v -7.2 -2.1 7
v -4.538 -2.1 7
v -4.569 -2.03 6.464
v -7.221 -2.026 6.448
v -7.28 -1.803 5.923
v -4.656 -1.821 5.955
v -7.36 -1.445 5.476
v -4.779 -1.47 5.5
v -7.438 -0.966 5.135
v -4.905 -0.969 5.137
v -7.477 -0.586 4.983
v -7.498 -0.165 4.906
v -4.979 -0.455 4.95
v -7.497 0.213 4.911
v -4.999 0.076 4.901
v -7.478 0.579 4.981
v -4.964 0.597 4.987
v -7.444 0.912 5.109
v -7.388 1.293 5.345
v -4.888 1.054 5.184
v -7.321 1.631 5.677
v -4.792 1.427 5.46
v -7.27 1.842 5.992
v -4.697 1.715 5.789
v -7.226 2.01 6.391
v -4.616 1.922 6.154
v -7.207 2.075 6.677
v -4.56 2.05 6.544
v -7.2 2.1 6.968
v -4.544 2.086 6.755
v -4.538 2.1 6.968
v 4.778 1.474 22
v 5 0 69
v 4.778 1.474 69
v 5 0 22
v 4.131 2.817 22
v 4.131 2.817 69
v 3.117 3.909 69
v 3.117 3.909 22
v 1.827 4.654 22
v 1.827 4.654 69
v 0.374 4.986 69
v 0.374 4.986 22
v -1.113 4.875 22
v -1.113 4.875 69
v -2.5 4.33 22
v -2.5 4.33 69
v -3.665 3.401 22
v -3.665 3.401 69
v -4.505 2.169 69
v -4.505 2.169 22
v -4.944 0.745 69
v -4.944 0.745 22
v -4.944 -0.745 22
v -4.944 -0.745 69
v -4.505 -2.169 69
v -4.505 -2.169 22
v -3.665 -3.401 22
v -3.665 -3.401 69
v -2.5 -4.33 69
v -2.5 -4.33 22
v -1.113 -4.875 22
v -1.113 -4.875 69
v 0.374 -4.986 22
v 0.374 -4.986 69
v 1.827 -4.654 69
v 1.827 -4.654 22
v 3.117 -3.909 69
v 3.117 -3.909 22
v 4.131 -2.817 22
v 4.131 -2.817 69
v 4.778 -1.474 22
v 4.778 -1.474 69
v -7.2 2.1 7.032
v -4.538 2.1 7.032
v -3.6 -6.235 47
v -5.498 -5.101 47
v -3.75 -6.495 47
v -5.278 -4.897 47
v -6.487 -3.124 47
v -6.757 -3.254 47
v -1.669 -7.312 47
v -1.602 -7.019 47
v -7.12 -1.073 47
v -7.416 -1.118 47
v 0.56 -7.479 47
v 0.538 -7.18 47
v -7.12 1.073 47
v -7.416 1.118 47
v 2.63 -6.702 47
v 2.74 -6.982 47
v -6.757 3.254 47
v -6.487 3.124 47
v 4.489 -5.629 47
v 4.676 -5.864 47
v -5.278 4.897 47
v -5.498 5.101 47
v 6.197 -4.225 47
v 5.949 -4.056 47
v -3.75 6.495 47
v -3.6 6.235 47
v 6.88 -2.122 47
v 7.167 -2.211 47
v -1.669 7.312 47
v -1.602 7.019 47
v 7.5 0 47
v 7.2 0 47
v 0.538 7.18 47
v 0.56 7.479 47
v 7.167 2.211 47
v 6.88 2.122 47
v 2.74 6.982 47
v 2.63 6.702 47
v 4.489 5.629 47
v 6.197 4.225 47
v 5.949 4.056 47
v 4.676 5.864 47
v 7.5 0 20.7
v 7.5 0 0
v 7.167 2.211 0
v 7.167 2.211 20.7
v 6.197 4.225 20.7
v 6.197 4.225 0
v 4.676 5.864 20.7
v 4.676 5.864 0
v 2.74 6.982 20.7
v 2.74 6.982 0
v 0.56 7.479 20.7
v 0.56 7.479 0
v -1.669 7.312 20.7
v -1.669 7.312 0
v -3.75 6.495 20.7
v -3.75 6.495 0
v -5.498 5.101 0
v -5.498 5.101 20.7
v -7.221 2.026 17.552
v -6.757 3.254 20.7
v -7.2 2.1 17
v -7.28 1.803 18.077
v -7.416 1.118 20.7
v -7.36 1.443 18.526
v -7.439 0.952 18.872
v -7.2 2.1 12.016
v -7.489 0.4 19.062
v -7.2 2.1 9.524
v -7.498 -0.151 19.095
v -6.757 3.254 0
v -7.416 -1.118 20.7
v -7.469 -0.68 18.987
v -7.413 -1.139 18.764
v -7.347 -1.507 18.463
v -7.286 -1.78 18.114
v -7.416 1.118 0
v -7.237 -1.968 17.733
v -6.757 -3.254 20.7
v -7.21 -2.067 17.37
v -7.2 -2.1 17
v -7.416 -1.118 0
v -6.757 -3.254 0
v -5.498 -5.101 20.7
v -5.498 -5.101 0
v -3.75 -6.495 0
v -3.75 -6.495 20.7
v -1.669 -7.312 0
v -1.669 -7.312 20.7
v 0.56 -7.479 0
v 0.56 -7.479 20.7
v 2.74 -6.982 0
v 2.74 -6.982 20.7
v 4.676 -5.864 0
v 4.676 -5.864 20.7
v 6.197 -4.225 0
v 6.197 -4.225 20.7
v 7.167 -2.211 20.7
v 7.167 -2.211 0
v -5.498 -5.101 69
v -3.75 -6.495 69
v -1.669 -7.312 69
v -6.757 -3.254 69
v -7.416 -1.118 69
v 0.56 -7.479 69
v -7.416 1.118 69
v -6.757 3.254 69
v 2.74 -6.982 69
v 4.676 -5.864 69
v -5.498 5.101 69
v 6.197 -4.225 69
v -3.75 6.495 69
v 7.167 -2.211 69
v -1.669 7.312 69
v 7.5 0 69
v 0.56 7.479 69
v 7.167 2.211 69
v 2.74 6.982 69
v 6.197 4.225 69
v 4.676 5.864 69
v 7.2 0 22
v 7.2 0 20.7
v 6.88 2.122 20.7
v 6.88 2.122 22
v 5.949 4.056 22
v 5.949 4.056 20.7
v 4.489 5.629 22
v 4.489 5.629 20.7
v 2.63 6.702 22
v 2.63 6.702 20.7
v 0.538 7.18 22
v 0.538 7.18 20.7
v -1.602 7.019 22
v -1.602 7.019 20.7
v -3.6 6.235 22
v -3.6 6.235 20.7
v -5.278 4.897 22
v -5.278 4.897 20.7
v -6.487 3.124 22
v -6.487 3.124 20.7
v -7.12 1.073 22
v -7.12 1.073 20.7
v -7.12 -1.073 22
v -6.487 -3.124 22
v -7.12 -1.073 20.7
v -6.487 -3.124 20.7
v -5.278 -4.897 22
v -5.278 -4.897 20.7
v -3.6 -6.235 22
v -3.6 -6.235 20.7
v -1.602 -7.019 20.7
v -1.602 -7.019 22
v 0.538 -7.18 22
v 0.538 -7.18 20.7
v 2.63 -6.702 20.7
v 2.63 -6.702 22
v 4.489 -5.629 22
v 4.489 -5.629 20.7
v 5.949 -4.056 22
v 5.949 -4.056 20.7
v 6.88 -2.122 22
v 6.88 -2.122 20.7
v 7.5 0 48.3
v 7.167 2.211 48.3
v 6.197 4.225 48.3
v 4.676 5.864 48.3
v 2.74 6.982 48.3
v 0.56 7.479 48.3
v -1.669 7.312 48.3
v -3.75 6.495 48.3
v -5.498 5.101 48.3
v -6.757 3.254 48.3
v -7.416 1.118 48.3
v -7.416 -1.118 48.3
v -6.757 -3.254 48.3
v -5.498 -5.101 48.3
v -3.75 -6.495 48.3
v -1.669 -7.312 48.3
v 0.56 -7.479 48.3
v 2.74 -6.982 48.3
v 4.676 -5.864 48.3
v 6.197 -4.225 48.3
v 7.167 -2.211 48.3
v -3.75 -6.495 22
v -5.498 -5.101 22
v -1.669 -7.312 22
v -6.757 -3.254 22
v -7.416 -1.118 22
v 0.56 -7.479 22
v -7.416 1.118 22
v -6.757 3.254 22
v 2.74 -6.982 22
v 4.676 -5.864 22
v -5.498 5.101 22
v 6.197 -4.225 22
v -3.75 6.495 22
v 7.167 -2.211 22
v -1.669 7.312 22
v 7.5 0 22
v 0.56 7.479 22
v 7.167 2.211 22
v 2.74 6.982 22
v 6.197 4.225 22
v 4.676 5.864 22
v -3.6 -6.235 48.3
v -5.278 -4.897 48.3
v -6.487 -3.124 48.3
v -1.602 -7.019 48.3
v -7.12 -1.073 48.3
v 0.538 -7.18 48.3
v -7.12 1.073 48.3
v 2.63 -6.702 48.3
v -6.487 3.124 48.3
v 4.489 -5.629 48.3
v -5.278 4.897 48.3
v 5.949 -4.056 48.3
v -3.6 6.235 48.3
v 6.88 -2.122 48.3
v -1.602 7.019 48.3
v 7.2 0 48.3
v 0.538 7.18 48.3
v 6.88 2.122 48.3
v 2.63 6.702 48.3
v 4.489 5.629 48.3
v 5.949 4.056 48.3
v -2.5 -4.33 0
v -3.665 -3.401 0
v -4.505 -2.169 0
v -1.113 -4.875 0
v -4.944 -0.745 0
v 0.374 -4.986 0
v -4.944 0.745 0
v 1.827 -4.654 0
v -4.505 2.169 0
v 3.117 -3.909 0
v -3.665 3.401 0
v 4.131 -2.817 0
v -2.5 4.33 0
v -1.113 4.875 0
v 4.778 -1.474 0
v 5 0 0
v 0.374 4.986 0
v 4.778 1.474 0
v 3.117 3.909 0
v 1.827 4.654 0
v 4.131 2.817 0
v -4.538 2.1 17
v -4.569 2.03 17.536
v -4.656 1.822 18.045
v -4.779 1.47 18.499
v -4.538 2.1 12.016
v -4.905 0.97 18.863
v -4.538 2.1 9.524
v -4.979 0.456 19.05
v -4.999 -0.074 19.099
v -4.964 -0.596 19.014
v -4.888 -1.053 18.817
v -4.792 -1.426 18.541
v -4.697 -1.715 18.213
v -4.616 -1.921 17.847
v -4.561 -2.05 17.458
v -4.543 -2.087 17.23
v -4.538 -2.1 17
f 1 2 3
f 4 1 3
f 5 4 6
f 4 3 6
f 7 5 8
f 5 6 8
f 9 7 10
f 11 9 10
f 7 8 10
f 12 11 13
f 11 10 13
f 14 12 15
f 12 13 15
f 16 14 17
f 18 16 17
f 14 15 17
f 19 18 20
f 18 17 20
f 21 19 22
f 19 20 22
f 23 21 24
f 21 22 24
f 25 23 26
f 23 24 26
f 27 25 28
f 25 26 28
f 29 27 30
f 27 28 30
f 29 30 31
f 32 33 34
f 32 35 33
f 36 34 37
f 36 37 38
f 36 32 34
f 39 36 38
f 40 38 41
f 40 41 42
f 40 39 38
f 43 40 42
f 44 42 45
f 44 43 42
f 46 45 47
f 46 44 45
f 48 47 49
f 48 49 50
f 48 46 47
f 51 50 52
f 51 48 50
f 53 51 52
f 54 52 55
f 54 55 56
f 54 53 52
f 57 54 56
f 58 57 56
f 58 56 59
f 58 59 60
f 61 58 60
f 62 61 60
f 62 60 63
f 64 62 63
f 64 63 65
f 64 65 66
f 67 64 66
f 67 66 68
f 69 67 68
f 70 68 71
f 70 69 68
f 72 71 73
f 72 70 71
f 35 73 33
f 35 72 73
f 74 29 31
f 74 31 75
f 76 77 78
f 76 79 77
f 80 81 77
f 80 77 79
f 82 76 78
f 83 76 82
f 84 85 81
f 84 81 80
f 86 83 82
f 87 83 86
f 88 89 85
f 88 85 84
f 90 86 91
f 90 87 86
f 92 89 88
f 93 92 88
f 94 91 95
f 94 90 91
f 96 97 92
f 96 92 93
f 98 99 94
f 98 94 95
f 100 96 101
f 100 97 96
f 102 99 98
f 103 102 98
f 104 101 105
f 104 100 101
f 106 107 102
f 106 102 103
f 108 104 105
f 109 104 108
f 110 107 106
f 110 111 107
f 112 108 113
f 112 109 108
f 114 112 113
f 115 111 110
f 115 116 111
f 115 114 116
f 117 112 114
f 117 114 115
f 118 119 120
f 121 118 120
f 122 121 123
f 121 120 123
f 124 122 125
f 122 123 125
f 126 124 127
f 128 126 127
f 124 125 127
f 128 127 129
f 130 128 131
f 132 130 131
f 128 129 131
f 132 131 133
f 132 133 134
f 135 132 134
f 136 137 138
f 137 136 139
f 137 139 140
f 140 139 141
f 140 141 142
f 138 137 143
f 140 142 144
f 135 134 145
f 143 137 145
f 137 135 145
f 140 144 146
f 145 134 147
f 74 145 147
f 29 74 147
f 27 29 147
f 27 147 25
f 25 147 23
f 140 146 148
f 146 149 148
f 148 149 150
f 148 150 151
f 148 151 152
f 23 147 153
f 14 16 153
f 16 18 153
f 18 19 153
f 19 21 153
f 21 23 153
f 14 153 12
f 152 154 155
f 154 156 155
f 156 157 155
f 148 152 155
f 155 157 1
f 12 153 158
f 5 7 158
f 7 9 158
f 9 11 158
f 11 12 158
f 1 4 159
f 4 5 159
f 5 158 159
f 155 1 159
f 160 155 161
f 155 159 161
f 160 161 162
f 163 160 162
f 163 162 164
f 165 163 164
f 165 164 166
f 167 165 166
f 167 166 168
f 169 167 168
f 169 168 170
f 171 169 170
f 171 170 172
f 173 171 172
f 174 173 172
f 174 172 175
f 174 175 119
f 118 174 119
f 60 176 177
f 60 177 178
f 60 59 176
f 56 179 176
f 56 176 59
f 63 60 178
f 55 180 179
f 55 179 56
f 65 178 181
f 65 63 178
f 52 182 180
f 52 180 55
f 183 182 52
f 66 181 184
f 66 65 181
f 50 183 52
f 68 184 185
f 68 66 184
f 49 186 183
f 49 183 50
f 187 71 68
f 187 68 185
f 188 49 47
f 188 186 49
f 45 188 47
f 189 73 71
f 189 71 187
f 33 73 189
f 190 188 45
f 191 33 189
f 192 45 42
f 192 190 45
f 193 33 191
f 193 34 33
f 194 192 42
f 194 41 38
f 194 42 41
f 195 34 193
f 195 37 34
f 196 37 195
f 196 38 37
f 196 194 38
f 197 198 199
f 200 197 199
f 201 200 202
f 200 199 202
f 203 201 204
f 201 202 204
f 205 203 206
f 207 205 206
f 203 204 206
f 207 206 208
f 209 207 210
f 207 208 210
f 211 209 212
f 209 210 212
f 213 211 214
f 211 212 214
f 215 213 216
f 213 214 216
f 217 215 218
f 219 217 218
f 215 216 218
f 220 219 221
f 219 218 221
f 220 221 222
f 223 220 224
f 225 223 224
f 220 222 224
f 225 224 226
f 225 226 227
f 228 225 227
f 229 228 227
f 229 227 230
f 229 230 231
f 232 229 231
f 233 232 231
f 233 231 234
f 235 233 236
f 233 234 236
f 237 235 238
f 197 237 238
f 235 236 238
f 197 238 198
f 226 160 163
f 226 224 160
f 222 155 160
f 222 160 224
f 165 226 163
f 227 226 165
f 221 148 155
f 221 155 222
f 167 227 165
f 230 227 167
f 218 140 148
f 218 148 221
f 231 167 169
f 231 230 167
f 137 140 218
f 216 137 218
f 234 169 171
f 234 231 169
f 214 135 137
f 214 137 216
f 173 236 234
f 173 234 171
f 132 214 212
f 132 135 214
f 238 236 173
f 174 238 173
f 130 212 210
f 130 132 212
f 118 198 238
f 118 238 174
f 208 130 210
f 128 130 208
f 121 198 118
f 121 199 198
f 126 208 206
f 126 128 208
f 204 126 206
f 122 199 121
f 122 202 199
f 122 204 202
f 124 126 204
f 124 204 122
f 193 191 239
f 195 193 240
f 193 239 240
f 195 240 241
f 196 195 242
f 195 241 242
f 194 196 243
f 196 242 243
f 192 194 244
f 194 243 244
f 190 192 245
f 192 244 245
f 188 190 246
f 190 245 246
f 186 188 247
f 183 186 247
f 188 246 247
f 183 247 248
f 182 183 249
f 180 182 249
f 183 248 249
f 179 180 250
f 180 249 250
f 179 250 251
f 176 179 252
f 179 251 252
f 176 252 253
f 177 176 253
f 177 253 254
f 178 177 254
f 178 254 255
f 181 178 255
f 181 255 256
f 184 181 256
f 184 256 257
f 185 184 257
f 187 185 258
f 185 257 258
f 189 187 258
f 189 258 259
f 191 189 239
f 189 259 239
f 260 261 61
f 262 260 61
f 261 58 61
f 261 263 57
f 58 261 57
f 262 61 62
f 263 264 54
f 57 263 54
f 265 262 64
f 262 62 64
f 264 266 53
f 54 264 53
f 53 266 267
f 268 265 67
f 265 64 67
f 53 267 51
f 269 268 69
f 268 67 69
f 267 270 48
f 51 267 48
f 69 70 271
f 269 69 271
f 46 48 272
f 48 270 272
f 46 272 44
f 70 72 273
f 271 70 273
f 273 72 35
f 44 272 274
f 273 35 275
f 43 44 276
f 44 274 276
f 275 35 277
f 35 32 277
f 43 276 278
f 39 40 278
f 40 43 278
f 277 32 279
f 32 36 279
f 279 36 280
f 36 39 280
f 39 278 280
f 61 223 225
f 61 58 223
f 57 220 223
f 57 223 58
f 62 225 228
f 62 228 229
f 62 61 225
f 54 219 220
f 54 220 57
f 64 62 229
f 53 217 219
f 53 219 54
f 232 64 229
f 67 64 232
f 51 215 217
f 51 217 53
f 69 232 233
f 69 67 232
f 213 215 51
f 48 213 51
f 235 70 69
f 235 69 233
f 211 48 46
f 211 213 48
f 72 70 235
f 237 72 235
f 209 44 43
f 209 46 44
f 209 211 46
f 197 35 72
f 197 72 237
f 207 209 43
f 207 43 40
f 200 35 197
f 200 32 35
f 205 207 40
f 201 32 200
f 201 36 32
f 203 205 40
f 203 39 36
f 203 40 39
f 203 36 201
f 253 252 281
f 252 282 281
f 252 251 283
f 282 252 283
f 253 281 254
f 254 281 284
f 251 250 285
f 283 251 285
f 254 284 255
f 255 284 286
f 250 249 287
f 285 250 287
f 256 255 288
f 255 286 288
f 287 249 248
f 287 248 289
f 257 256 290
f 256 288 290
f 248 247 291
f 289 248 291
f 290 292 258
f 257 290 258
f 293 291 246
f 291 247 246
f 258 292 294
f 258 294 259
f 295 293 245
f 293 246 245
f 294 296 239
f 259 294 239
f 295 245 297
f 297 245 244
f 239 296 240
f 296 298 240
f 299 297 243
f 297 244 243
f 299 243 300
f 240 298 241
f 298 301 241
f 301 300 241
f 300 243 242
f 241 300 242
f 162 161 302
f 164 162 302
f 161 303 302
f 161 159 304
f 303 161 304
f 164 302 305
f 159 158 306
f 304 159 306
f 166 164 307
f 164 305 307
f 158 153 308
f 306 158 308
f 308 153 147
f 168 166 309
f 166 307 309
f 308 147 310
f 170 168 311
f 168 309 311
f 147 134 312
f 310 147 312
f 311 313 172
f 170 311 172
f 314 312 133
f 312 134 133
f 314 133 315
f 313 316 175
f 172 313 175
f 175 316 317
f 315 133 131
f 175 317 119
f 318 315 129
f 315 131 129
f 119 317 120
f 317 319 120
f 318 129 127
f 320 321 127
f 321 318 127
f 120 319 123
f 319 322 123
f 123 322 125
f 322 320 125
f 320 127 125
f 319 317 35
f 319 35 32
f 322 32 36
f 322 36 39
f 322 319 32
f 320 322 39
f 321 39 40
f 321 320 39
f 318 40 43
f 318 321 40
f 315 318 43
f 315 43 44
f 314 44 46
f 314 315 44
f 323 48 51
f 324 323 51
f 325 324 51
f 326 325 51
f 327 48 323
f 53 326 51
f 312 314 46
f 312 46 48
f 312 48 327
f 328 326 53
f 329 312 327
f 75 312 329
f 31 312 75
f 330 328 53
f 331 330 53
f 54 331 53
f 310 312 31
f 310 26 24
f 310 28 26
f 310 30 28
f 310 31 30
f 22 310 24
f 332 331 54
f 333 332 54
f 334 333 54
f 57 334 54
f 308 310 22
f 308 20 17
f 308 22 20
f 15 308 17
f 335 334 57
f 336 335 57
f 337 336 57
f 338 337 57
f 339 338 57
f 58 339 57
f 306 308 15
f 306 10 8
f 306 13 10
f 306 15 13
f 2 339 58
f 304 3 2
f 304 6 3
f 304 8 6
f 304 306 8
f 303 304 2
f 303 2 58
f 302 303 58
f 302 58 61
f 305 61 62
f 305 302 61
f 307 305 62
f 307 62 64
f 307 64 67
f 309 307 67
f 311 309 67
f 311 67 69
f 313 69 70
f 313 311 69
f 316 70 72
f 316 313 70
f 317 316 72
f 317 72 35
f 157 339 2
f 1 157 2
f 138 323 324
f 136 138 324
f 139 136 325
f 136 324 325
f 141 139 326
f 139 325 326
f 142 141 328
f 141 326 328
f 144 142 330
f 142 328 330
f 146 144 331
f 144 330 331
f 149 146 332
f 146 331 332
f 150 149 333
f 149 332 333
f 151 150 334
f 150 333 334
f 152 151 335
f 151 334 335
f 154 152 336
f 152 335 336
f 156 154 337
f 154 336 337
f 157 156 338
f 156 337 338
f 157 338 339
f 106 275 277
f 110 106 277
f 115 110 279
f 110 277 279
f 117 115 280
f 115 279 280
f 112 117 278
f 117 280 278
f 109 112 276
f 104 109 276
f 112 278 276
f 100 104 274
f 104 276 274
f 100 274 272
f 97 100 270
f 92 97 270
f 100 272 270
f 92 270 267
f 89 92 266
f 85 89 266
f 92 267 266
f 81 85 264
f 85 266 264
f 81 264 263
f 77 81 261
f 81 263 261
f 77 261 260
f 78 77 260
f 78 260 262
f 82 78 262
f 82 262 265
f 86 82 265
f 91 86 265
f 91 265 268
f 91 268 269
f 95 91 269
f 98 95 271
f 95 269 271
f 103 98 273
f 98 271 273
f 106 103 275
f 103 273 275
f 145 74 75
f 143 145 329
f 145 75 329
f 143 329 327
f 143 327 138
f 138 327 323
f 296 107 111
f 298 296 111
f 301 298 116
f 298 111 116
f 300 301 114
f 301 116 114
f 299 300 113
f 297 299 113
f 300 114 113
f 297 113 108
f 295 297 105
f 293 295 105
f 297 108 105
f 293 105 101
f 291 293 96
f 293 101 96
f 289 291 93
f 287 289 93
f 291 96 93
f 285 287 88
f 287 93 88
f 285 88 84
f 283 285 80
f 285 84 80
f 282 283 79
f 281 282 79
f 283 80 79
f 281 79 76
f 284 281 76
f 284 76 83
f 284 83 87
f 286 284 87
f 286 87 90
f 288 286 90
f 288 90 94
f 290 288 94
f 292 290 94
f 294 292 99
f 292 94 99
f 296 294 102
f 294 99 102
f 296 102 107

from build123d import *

# Parameters (mm, degrees)
F0_R      = 7.5
F0_R_2    = 5
F1_DEPTH  = 20.7
F2_R      = 7.2
F2_R_2    = 5
F3_DEPTH  = 1.3
F4_R      = 7.5
F4_R_2    = 7.2
F4_R_3    = 5
F5_DEPTH  = 25
F6_R      = 7.2
F6_R_2    = 5
F7_DEPTH  = 1.3
F8_R      = 7.5
F8_R_2    = 7.2
F8_R_3    = 5
F9_DEPTH  = 20.7
F11_DEPTH = 7.5


with BuildPart() as f1:
    # F0 (on Top) → F1 (new body)
    with BuildSketch(Plane.XY):
        Circle(F0_R)
        Circle(F0_R_2, mode=Mode.SUBTRACT)
    extrude(amount=F1_DEPTH)

    # F2 (on face) → F3 (join)
    with BuildSketch(Plane.XY.offset(20.7)):
        Circle(F2_R)
        Circle(F2_R_2, mode=Mode.SUBTRACT)
    extrude(amount=F3_DEPTH)

    # F10 (on Right) → F11 (cut)
    with BuildSketch(Plane.YZ):
        with BuildLine():
            Line((-2.1, 17), (-2.1, 7))
            ThreePointArc((-2.1, 7), (-0.016243837, 4.9000628253), (2.0997487026, 6.9675132978))
            Line((2.0997487026, 6.9675132978), (2.0997503275, 7.0323815113))
            Line((2.0997503275, 7.0323815113), (2.0999999993, 16.9999473983))
            ThreePointArc((2.0999999993, 16.9999473983), (2.63009e-05, 19.0999999998), (-2.1, 17))
        make_face()
        with BuildLine():
            Line((2.0997503275, 7.0323815113), (2.0997487026, 6.9675132978))
            ThreePointArc((2.0997487026, 6.9675132978), (2.0999999993, 6.9999473983), (2.0997503275, 7.0323815113))
        make_face()
    extrude(amount=-F11_DEPTH, mode=Mode.SUBTRACT)


with BuildPart() as f5:
    # F4 (on face) → F5 (new body)
    with BuildSketch(Plane.XY.offset(22)):
        Circle(F4_R)
        Circle(F4_R_2, mode=Mode.SUBTRACT)
        Circle(F4_R_2)
        Circle(F4_R_3, mode=Mode.SUBTRACT)
    extrude(amount=F5_DEPTH)

    # F6 (on face) → F7 (join)
    with BuildSketch(Plane.XY.offset(47)):
        Circle(F6_R)
        Circle(F6_R_2, mode=Mode.SUBTRACT)
    extrude(amount=F7_DEPTH)

    # F8 (on face) → F9 (join)
    with BuildSketch(Plane.XY.offset(48.3)):
        Circle(F8_R)
        Circle(F8_R_2, mode=Mode.SUBTRACT)
        Circle(F8_R_2)
        Circle(F8_R_3, mode=Mode.SUBTRACT)
    extrude(amount=F9_DEPTH)


solid = Compound([f1.part, f5.part])
